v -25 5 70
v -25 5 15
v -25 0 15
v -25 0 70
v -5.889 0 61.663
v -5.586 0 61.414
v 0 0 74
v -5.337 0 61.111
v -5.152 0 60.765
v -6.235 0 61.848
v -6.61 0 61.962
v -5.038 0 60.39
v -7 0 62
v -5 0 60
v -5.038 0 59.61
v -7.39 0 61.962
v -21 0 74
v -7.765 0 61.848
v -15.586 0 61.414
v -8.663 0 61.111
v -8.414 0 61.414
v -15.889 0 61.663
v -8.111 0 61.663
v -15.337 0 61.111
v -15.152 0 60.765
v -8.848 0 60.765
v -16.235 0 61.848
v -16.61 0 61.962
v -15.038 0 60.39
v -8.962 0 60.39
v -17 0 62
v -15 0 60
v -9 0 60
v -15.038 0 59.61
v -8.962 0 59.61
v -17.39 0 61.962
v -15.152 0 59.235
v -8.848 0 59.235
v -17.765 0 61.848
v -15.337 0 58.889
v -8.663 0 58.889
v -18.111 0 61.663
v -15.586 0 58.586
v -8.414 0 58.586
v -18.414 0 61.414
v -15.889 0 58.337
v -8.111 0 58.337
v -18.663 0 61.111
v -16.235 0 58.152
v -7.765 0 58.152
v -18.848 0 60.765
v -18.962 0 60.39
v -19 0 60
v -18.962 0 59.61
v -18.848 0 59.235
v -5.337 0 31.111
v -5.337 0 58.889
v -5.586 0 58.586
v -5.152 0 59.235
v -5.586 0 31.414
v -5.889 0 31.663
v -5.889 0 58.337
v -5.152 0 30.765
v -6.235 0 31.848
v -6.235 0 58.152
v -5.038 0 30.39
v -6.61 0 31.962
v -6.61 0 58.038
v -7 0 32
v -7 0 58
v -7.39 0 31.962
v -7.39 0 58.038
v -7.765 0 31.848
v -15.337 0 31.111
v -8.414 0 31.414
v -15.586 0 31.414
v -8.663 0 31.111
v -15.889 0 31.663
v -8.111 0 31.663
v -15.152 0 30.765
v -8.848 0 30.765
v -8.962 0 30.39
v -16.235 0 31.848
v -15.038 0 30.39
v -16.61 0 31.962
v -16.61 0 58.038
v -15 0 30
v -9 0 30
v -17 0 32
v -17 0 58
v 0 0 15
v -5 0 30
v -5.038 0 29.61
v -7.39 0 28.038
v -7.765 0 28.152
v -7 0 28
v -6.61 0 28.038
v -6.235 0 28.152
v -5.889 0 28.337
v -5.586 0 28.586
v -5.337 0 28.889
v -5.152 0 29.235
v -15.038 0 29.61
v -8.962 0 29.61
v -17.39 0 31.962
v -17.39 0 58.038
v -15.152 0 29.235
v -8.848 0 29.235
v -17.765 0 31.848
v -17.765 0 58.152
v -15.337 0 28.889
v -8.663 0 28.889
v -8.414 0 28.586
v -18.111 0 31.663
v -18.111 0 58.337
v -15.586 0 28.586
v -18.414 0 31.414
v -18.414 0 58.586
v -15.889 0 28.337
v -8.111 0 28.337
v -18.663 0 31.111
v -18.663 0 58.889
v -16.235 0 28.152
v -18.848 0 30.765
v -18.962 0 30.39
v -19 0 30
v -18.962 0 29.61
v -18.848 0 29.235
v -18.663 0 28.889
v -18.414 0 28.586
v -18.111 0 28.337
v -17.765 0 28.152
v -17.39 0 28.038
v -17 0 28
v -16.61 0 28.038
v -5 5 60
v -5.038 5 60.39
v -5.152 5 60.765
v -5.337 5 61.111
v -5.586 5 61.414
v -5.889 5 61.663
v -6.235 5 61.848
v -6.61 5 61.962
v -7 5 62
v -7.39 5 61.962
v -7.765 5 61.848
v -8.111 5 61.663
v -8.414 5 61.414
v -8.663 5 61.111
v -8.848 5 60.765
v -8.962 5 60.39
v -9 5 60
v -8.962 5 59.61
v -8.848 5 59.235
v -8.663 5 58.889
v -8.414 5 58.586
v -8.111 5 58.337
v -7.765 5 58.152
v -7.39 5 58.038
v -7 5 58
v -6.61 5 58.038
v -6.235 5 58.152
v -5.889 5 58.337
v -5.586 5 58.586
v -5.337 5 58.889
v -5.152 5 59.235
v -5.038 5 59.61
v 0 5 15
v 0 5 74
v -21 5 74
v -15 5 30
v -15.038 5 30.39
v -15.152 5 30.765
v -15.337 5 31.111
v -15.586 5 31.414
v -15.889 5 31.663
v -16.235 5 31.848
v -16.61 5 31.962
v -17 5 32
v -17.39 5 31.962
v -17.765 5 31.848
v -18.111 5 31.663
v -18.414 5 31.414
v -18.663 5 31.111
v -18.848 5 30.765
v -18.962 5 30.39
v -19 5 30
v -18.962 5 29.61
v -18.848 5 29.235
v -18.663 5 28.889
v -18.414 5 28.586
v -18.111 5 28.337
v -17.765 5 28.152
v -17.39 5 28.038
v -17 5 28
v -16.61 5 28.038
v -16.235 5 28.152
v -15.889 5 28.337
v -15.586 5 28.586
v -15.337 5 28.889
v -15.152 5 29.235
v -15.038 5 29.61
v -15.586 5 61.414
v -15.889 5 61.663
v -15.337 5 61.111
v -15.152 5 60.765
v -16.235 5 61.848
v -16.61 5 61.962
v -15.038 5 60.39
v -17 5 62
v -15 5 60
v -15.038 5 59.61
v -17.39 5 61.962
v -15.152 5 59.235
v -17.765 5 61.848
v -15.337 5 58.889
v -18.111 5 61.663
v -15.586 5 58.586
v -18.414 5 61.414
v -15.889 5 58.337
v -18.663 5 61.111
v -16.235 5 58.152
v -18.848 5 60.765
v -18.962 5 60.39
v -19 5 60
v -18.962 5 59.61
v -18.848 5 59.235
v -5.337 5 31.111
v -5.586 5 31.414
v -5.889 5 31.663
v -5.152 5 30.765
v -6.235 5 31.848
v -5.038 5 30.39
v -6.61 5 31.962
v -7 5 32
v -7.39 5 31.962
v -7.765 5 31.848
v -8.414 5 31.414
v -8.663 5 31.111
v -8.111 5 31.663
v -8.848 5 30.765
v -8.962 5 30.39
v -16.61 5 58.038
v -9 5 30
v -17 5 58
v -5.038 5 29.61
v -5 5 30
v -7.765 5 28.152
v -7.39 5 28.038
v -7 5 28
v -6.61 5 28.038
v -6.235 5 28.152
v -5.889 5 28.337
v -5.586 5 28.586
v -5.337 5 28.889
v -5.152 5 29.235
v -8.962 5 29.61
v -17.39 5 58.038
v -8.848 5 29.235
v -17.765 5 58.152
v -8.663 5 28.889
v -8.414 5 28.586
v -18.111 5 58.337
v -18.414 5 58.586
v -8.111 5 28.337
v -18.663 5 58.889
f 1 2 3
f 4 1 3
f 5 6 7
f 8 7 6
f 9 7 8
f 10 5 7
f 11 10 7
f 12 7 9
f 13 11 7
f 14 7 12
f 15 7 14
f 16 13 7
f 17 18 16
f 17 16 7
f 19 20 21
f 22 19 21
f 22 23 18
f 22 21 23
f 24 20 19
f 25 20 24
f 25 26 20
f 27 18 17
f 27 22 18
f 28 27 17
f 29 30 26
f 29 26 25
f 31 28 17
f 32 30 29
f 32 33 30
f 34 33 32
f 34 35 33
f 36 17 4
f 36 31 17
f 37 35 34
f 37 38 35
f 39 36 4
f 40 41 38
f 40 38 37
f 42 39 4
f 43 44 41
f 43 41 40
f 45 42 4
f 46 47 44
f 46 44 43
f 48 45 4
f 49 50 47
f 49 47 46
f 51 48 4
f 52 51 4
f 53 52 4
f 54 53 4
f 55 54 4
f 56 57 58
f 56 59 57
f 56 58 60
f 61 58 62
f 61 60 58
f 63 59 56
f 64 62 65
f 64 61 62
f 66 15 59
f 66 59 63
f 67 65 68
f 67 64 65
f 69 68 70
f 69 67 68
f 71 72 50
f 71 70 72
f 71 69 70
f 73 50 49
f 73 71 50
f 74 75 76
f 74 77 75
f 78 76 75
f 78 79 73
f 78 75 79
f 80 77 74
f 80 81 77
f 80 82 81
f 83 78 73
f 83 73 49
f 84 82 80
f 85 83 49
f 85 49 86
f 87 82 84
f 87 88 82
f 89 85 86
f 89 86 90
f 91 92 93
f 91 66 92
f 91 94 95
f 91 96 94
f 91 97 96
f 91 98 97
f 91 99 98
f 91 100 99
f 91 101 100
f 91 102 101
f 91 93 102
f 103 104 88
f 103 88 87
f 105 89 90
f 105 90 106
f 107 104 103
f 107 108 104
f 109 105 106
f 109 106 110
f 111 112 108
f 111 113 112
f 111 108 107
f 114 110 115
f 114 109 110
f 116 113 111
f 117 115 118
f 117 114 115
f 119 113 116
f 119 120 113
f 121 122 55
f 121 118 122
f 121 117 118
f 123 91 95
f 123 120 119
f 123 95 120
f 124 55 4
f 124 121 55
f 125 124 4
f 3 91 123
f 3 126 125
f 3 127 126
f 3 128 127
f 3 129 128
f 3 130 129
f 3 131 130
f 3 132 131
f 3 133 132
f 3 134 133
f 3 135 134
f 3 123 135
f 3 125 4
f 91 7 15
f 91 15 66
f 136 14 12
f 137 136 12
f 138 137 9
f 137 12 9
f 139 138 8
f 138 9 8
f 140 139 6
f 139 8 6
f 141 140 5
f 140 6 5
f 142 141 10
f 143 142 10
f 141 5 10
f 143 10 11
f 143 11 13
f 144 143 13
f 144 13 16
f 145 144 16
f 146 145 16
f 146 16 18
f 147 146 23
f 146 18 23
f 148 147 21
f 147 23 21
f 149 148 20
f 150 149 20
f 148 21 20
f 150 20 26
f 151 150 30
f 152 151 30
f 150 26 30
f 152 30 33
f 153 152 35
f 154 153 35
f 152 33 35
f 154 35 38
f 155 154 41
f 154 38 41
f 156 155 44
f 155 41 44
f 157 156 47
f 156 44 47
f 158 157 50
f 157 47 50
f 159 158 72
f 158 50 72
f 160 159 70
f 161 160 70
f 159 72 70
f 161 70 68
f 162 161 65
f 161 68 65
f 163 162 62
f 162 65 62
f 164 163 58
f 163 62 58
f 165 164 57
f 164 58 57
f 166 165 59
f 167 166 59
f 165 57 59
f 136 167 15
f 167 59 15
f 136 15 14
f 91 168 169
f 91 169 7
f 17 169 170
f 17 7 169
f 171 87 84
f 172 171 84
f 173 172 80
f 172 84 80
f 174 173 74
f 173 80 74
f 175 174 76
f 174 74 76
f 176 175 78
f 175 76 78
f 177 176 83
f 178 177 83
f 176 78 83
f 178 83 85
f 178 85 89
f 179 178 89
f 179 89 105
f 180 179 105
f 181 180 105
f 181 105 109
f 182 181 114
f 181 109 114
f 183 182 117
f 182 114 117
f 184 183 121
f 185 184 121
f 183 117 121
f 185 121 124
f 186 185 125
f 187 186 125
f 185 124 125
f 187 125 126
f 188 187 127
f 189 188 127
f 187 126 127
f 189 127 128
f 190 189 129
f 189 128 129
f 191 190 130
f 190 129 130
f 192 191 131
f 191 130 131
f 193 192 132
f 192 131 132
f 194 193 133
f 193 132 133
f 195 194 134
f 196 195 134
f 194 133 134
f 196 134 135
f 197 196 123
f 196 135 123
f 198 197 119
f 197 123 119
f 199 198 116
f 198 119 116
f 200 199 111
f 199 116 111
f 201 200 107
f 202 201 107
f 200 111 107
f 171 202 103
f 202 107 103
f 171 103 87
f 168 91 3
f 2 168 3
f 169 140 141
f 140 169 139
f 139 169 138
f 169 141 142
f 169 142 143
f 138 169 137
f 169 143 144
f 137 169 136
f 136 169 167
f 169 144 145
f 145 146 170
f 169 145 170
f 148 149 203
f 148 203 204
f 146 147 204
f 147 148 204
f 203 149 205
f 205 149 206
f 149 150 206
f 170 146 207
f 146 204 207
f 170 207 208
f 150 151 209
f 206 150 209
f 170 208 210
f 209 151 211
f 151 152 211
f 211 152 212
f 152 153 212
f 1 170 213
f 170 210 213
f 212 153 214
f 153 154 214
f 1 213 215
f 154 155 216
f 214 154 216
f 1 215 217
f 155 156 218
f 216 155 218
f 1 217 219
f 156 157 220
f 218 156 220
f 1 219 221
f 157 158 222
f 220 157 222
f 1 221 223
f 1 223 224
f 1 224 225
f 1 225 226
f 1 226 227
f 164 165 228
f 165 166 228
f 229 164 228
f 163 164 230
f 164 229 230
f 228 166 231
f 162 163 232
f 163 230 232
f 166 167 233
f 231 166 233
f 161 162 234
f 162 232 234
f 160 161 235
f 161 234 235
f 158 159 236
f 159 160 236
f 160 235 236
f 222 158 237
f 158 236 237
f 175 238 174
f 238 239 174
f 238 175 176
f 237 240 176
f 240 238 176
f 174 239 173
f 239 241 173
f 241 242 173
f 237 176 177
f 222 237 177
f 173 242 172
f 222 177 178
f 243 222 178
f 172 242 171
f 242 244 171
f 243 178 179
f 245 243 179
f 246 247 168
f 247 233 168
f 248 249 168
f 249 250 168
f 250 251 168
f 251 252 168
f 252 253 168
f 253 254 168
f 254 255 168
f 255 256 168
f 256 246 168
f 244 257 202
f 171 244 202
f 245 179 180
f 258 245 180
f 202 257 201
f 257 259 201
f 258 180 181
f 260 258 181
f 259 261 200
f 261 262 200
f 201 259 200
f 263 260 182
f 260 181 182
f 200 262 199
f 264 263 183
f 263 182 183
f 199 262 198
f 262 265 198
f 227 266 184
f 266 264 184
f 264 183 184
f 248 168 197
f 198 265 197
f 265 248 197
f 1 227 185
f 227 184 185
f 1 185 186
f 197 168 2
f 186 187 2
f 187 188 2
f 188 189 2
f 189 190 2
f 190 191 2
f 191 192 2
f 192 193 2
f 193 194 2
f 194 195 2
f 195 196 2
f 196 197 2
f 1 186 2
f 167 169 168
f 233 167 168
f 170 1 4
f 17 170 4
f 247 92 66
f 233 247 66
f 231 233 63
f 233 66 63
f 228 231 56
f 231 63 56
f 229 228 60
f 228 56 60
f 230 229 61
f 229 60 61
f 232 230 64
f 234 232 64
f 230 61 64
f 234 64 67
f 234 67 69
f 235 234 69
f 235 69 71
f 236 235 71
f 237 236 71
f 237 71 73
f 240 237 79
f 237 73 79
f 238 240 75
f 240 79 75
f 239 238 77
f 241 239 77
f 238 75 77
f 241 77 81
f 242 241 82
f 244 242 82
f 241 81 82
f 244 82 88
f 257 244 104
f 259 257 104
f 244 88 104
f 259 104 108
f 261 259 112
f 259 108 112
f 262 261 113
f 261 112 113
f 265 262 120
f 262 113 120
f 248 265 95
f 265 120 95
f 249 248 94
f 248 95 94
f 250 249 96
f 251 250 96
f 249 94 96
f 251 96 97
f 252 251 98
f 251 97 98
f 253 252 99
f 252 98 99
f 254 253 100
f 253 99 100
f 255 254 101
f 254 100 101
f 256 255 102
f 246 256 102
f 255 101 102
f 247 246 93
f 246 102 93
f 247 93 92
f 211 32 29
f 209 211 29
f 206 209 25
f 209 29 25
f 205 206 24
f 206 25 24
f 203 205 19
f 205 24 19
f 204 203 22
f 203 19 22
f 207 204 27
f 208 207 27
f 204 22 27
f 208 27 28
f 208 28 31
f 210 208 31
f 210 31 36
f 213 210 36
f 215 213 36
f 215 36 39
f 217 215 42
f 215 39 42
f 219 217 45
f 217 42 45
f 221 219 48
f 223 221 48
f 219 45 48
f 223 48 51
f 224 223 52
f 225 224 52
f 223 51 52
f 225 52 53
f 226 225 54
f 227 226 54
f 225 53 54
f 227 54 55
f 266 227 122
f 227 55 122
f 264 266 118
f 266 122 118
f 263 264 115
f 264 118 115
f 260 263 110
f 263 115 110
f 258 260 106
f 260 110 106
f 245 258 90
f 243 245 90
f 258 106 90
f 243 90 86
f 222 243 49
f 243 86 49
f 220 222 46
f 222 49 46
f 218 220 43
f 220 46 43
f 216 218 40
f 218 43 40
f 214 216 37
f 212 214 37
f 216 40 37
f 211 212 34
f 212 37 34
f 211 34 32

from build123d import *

# Parameters (mm, degrees)
CIRCLE002_R      = 2
EXTRUDE088_DEPTH = 5
CIRCLE_R         = 2
EXTRUDE089_DEPTH = 5
CIRCLE001_R      = 2
EXTRUDE087_DEPTH = 5
CIRCLE003_R      = 2
EXTRUDE086_DEPTH = 5
RECTANGLE068_W   = 25
RECTANGLE068_H   = 5
EXTRUDE083_DEPTH = 59
CHAMFER008_SIZE  = 4


with BuildPart() as extrude088:
    # Circle002 → Extrude088 (new body)
    with BuildSketch(Plane(origin=(-17, 0, 30), x_dir=(1, 0, 0), z_dir=(0, -1, 0))):
        Circle(CIRCLE002_R)
    extrude(amount=-EXTRUDE088_DEPTH)


with BuildPart() as extrude089:
    # Circle → Extrude089 (new body)
    with BuildSketch(Plane(origin=(-7, 0, 30), x_dir=(1, 0, 0), z_dir=(0, -1, 0))):
        Circle(CIRCLE_R)
    extrude(amount=-EXTRUDE089_DEPTH)


with BuildPart() as extrude087:
    # Circle001 → Extrude087 (new body)
    with BuildSketch(Plane(origin=(-17, 0, 60), x_dir=(1, 0, 0), z_dir=(0, -1, 0))):
        Circle(CIRCLE001_R)
    extrude(amount=-EXTRUDE087_DEPTH)


with BuildPart() as extrude086:
    # Circle003 → Extrude086 (new body)
    with BuildSketch(Plane(origin=(-7, 0, 60), x_dir=(1, 0, 0), z_dir=(0, -1, 0))):
        Circle(CIRCLE003_R)
    extrude(amount=-EXTRUDE086_DEPTH)


with BuildPart() as cut007:
    # Rectangle068 → Extrude083 (new body)
    with BuildSketch(Plane(origin=(0, 5, 15), x_dir=(-1, 0, 0), z_dir=(0, 0, 1))):
        with Locations((12.5, 2.5)):
            Rectangle(RECTANGLE068_W, RECTANGLE068_H)
    extrude(amount=EXTRUDE083_DEPTH)

    # Chamfer008
    chamfer008_edges = [cut007.edges().sort_by_distance(p)[0] for p in [
        (-25, 2.5, 74),
    ]]
    chamfer(chamfer008_edges, length=CHAMFER008_SIZE)

    # Cut004: cut Extrude086
    add(extrude086.part, mode=Mode.SUBTRACT)

    # Cut005: cut Extrude087
    add(extrude087.part, mode=Mode.SUBTRACT)

    # Cut006: cut Extrude089
    add(extrude089.part, mode=Mode.SUBTRACT)

    # Cut007: cut Extrude088
    add(extrude088.part, mode=Mode.SUBTRACT)


solid = cut007.part
